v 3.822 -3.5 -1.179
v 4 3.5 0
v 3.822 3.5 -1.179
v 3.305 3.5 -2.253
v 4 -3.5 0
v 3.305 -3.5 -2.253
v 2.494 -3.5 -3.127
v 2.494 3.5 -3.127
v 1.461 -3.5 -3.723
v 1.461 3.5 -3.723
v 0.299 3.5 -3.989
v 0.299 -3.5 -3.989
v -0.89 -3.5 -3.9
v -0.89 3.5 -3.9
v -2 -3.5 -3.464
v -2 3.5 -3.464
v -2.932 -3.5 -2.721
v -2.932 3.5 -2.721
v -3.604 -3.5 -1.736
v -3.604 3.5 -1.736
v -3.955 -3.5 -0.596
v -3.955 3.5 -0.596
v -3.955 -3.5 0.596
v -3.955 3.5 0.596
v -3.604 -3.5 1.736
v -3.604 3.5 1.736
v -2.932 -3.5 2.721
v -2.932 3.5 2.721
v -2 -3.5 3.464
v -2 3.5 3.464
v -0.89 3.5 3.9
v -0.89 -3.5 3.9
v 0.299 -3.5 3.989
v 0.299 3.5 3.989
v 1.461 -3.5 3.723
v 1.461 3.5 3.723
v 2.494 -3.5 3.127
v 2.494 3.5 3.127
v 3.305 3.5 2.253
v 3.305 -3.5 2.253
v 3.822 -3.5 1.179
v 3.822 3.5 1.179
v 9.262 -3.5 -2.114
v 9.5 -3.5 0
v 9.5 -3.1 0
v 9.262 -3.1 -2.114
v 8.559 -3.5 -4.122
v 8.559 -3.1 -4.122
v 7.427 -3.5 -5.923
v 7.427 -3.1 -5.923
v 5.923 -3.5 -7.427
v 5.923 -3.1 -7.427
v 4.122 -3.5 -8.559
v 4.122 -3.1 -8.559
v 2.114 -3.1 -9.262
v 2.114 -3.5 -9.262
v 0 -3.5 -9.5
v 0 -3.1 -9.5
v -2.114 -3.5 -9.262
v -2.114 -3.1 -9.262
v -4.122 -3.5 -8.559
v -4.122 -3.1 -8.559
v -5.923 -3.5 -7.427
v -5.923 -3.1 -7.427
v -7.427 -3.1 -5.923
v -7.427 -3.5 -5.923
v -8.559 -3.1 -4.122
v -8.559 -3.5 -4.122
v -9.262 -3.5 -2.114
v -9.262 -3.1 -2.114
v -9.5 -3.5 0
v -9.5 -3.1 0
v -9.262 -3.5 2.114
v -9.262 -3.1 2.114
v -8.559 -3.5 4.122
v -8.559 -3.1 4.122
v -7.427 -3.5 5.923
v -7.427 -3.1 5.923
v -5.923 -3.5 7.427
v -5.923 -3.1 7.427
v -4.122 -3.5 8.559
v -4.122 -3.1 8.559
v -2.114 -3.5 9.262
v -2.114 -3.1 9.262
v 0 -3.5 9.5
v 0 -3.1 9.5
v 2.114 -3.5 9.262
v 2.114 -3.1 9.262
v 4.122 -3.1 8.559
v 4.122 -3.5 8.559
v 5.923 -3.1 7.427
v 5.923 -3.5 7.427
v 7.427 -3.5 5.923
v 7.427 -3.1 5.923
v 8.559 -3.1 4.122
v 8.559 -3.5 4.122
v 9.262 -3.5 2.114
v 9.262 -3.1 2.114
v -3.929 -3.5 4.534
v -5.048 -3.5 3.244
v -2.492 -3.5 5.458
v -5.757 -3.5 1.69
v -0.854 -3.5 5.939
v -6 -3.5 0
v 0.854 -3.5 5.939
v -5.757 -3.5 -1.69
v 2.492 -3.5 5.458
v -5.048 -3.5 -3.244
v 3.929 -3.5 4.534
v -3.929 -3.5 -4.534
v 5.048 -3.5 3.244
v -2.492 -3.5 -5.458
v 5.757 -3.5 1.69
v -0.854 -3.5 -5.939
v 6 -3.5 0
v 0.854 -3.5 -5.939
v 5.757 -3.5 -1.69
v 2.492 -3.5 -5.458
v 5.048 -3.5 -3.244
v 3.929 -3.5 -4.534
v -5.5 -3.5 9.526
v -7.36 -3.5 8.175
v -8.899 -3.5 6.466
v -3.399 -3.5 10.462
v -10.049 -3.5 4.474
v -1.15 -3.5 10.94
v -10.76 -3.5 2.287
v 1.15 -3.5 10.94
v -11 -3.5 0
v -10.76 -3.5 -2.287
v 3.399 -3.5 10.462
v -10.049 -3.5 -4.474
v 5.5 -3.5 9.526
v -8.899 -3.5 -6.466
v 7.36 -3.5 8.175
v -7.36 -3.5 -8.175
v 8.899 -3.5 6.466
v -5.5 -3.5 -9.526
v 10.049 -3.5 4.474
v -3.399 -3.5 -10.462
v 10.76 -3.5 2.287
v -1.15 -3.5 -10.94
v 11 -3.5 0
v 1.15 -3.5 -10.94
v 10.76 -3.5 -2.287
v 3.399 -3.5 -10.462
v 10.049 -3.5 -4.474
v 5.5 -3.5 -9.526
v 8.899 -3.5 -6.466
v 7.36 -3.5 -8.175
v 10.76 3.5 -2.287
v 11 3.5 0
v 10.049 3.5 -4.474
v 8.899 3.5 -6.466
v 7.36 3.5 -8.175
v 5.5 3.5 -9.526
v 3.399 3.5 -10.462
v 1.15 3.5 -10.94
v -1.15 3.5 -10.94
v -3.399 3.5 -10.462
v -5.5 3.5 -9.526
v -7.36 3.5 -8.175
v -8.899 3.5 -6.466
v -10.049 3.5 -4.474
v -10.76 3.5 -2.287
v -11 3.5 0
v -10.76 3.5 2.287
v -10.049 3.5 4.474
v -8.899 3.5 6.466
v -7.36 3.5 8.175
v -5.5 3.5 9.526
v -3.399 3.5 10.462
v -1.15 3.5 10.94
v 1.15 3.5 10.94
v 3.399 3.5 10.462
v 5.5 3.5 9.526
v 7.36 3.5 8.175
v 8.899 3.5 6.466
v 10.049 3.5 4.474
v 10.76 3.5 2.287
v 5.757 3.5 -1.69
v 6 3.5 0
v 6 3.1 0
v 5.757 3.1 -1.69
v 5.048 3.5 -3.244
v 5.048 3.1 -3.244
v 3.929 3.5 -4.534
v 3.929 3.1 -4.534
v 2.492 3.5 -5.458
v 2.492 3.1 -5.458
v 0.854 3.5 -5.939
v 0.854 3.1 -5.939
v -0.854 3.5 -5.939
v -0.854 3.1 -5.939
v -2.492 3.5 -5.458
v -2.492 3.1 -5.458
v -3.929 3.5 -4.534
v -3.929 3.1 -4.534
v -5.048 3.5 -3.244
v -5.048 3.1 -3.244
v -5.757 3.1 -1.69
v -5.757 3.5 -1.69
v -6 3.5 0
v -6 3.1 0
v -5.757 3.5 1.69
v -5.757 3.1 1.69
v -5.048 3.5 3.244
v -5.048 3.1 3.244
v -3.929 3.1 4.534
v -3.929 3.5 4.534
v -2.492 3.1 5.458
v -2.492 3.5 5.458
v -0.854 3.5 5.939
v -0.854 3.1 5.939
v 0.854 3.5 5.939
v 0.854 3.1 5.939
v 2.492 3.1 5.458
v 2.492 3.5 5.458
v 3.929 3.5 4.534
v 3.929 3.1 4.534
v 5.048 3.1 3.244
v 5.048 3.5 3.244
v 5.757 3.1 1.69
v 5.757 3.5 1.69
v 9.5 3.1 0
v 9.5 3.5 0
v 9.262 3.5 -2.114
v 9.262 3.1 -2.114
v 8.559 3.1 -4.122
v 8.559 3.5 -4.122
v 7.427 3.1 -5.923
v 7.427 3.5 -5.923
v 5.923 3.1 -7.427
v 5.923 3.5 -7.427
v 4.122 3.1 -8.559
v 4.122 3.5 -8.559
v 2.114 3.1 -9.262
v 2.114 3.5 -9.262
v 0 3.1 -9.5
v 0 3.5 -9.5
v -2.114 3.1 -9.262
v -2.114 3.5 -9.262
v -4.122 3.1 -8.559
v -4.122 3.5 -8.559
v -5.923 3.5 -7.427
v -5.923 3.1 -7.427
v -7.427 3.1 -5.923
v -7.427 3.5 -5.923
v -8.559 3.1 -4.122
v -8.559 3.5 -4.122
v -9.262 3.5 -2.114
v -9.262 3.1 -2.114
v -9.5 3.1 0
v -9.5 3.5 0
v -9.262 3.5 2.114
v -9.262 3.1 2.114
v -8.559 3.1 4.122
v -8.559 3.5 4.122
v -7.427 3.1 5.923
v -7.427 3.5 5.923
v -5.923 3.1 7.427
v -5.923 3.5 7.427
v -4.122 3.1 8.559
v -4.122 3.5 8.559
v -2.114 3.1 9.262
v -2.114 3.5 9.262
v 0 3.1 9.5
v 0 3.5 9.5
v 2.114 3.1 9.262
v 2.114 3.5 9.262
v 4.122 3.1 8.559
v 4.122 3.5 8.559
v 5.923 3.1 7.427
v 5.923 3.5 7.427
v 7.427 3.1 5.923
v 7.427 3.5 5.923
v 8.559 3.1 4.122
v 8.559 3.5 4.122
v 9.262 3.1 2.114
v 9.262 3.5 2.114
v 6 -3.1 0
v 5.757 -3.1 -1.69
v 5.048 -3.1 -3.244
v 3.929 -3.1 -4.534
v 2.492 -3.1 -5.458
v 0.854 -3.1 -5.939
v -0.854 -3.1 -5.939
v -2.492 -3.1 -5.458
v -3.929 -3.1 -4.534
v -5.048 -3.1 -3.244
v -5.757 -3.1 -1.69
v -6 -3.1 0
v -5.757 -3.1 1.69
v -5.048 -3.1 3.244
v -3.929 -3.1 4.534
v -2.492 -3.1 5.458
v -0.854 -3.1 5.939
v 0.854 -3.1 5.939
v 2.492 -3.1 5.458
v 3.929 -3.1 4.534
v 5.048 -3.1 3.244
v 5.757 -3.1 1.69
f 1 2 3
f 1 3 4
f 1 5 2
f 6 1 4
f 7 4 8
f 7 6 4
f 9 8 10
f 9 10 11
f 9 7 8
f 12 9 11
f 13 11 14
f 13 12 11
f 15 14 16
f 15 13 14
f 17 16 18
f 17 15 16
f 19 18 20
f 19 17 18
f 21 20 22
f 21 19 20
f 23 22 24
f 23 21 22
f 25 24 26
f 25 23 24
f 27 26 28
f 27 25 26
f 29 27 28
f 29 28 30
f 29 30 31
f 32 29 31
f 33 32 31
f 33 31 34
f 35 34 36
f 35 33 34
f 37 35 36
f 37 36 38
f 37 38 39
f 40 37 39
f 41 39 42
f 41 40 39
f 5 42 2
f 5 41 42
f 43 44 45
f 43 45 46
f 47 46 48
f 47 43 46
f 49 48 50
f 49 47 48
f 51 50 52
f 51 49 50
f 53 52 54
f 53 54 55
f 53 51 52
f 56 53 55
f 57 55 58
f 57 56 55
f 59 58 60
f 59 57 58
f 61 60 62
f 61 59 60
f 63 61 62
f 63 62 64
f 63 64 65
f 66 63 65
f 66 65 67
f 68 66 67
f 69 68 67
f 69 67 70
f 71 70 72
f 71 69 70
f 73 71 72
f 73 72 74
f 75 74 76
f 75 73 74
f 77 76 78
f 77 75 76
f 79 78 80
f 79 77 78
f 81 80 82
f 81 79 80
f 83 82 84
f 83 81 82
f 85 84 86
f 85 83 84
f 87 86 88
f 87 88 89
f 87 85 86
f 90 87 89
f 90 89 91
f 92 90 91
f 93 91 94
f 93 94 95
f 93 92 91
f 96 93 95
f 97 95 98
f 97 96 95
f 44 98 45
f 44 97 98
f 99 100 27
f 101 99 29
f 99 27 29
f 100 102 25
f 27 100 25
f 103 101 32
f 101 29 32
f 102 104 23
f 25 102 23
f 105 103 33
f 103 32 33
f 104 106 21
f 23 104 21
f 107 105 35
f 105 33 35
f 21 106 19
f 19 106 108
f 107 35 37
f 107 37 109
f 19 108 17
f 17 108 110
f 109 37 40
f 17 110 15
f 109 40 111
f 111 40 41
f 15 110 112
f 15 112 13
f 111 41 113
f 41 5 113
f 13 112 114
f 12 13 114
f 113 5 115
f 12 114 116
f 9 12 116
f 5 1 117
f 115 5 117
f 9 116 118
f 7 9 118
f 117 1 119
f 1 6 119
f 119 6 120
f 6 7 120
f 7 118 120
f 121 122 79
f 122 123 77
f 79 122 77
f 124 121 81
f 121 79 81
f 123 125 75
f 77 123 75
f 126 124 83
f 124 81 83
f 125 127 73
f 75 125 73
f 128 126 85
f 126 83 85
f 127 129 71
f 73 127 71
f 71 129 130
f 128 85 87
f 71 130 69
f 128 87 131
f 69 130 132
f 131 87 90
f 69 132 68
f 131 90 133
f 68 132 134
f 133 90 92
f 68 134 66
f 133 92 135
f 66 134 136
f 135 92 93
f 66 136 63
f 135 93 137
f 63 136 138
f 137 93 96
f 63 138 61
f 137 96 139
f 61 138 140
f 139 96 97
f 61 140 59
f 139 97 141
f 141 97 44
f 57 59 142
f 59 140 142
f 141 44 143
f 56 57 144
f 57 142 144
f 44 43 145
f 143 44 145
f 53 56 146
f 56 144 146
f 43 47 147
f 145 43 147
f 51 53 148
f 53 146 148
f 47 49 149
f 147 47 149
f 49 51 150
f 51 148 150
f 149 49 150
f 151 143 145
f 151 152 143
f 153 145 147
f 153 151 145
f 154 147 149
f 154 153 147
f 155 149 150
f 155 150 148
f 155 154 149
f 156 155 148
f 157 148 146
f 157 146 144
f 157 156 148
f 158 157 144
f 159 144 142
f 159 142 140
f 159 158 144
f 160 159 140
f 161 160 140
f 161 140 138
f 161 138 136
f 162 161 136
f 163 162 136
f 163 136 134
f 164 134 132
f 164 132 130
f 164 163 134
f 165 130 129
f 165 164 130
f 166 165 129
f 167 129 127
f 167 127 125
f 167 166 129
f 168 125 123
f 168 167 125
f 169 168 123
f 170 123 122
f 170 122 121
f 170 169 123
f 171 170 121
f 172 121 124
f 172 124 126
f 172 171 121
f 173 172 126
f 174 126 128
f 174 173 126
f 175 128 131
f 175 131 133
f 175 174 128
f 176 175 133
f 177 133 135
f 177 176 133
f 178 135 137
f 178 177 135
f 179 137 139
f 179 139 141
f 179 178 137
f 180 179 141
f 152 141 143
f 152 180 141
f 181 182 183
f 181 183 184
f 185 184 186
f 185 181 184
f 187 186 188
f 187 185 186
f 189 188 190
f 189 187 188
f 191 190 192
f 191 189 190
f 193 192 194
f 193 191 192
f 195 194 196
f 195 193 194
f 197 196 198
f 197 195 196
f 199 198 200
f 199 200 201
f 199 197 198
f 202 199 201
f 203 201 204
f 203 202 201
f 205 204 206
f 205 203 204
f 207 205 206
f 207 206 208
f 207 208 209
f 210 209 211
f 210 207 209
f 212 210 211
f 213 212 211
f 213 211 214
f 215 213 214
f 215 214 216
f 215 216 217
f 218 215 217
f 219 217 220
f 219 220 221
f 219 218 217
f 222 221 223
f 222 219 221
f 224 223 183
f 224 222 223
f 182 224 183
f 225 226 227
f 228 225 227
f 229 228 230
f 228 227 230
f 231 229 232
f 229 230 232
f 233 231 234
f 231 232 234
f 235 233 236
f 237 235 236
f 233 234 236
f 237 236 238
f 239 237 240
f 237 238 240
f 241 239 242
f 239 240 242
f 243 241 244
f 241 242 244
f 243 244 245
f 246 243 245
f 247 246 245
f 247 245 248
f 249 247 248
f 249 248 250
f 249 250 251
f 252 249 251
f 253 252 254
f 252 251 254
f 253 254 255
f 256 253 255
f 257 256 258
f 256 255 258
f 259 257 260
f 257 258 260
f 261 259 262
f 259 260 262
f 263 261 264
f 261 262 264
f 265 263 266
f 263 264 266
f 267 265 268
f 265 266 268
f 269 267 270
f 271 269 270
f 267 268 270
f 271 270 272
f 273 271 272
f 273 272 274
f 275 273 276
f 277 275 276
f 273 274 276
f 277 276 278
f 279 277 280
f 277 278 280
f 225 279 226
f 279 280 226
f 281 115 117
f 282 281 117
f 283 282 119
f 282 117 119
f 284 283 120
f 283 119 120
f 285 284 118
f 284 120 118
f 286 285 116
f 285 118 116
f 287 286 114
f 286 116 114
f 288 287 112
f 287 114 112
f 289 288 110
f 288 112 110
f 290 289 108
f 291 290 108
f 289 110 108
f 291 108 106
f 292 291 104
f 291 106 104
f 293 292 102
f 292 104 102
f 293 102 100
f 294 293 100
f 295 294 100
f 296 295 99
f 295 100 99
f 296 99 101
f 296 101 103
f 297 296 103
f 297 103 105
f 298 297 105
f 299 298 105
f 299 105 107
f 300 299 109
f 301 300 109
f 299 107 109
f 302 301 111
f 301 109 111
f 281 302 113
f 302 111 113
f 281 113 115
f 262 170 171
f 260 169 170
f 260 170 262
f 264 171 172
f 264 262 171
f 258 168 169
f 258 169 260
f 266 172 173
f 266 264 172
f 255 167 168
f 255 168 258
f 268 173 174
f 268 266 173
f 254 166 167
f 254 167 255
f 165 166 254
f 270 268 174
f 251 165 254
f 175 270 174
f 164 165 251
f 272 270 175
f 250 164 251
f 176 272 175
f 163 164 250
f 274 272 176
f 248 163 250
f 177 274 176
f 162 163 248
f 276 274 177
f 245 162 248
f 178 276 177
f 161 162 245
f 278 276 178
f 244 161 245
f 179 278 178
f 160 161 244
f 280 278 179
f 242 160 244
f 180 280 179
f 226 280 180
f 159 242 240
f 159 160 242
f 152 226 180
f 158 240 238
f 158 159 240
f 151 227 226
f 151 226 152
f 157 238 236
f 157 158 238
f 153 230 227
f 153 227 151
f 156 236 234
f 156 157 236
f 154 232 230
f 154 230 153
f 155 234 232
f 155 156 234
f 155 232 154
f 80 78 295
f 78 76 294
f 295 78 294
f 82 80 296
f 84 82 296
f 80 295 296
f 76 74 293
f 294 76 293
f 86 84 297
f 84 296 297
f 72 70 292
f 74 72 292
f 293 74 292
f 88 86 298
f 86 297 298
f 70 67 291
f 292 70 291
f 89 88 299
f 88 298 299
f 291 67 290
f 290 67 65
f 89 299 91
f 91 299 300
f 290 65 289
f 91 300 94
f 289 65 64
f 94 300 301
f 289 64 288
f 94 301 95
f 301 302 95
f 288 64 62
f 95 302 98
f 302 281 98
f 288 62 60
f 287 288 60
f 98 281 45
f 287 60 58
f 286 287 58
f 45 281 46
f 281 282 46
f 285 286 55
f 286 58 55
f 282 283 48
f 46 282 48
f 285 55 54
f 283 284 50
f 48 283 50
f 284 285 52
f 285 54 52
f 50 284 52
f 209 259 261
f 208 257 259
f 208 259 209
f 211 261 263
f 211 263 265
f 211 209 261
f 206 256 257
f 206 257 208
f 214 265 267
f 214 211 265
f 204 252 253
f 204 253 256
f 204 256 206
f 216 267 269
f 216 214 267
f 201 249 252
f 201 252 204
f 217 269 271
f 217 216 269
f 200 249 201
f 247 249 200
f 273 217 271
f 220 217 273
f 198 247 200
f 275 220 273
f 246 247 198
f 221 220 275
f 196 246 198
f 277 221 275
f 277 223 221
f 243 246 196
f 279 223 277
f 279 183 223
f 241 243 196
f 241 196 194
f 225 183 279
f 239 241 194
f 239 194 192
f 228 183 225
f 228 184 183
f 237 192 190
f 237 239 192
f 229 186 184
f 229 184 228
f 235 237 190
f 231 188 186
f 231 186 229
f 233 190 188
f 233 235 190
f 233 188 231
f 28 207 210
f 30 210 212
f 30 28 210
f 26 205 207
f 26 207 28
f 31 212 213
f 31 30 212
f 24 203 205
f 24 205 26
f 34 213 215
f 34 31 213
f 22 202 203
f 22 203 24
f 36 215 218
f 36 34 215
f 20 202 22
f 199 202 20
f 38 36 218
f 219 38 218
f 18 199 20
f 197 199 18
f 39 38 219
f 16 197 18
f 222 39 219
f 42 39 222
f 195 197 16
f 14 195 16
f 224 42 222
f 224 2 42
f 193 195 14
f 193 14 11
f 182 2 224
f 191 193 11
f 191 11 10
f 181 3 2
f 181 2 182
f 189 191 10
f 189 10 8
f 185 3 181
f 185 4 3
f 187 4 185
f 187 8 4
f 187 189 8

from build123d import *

# Parameters (mm, degrees)
SKETCH_1_R          = 11
SKETCH_1_R_2        = 4
EXTRUDE_1_DEPTH     = 3.5
CUT_EXTRUDE_START   = 3.5
SKETCH_2_R          = 9.5
SKETCH_2_R_2        = 6
CUT_EXTRUDE_1_DEPTH = 0.4


with BuildPart() as part:
    # 草圖1 → 填料-伸長1 (new body, symmetric)
    with BuildSketch(Plane(origin=(0, 0, 0), x_dir=(1, 0, 0), z_dir=(0, 1, 0))):
        Circle(SKETCH_1_R)
        Circle(SKETCH_1_R_2, mode=Mode.SUBTRACT)
    extrude(amount=EXTRUDE_1_DEPTH, both=True)

    # 草圖2 → 除料-伸長1 (cut)
    with BuildSketch(Plane(origin=(0, 0, 0), x_dir=(1, 0, 0), z_dir=(0, 1, 0)).offset(CUT_EXTRUDE_START)):
        Circle(SKETCH_2_R)
        Circle(SKETCH_2_R_2, mode=Mode.SUBTRACT)
    cut_extrude_1 = extrude(amount=-CUT_EXTRUDE_1_DEPTH, mode=Mode.SUBTRACT)

    # 鏡射4: 除料-伸長1 across plane
    add(cut_extrude_1.mirror(Plane.ZX), mode=Mode.SUBTRACT)


solid = part.part
